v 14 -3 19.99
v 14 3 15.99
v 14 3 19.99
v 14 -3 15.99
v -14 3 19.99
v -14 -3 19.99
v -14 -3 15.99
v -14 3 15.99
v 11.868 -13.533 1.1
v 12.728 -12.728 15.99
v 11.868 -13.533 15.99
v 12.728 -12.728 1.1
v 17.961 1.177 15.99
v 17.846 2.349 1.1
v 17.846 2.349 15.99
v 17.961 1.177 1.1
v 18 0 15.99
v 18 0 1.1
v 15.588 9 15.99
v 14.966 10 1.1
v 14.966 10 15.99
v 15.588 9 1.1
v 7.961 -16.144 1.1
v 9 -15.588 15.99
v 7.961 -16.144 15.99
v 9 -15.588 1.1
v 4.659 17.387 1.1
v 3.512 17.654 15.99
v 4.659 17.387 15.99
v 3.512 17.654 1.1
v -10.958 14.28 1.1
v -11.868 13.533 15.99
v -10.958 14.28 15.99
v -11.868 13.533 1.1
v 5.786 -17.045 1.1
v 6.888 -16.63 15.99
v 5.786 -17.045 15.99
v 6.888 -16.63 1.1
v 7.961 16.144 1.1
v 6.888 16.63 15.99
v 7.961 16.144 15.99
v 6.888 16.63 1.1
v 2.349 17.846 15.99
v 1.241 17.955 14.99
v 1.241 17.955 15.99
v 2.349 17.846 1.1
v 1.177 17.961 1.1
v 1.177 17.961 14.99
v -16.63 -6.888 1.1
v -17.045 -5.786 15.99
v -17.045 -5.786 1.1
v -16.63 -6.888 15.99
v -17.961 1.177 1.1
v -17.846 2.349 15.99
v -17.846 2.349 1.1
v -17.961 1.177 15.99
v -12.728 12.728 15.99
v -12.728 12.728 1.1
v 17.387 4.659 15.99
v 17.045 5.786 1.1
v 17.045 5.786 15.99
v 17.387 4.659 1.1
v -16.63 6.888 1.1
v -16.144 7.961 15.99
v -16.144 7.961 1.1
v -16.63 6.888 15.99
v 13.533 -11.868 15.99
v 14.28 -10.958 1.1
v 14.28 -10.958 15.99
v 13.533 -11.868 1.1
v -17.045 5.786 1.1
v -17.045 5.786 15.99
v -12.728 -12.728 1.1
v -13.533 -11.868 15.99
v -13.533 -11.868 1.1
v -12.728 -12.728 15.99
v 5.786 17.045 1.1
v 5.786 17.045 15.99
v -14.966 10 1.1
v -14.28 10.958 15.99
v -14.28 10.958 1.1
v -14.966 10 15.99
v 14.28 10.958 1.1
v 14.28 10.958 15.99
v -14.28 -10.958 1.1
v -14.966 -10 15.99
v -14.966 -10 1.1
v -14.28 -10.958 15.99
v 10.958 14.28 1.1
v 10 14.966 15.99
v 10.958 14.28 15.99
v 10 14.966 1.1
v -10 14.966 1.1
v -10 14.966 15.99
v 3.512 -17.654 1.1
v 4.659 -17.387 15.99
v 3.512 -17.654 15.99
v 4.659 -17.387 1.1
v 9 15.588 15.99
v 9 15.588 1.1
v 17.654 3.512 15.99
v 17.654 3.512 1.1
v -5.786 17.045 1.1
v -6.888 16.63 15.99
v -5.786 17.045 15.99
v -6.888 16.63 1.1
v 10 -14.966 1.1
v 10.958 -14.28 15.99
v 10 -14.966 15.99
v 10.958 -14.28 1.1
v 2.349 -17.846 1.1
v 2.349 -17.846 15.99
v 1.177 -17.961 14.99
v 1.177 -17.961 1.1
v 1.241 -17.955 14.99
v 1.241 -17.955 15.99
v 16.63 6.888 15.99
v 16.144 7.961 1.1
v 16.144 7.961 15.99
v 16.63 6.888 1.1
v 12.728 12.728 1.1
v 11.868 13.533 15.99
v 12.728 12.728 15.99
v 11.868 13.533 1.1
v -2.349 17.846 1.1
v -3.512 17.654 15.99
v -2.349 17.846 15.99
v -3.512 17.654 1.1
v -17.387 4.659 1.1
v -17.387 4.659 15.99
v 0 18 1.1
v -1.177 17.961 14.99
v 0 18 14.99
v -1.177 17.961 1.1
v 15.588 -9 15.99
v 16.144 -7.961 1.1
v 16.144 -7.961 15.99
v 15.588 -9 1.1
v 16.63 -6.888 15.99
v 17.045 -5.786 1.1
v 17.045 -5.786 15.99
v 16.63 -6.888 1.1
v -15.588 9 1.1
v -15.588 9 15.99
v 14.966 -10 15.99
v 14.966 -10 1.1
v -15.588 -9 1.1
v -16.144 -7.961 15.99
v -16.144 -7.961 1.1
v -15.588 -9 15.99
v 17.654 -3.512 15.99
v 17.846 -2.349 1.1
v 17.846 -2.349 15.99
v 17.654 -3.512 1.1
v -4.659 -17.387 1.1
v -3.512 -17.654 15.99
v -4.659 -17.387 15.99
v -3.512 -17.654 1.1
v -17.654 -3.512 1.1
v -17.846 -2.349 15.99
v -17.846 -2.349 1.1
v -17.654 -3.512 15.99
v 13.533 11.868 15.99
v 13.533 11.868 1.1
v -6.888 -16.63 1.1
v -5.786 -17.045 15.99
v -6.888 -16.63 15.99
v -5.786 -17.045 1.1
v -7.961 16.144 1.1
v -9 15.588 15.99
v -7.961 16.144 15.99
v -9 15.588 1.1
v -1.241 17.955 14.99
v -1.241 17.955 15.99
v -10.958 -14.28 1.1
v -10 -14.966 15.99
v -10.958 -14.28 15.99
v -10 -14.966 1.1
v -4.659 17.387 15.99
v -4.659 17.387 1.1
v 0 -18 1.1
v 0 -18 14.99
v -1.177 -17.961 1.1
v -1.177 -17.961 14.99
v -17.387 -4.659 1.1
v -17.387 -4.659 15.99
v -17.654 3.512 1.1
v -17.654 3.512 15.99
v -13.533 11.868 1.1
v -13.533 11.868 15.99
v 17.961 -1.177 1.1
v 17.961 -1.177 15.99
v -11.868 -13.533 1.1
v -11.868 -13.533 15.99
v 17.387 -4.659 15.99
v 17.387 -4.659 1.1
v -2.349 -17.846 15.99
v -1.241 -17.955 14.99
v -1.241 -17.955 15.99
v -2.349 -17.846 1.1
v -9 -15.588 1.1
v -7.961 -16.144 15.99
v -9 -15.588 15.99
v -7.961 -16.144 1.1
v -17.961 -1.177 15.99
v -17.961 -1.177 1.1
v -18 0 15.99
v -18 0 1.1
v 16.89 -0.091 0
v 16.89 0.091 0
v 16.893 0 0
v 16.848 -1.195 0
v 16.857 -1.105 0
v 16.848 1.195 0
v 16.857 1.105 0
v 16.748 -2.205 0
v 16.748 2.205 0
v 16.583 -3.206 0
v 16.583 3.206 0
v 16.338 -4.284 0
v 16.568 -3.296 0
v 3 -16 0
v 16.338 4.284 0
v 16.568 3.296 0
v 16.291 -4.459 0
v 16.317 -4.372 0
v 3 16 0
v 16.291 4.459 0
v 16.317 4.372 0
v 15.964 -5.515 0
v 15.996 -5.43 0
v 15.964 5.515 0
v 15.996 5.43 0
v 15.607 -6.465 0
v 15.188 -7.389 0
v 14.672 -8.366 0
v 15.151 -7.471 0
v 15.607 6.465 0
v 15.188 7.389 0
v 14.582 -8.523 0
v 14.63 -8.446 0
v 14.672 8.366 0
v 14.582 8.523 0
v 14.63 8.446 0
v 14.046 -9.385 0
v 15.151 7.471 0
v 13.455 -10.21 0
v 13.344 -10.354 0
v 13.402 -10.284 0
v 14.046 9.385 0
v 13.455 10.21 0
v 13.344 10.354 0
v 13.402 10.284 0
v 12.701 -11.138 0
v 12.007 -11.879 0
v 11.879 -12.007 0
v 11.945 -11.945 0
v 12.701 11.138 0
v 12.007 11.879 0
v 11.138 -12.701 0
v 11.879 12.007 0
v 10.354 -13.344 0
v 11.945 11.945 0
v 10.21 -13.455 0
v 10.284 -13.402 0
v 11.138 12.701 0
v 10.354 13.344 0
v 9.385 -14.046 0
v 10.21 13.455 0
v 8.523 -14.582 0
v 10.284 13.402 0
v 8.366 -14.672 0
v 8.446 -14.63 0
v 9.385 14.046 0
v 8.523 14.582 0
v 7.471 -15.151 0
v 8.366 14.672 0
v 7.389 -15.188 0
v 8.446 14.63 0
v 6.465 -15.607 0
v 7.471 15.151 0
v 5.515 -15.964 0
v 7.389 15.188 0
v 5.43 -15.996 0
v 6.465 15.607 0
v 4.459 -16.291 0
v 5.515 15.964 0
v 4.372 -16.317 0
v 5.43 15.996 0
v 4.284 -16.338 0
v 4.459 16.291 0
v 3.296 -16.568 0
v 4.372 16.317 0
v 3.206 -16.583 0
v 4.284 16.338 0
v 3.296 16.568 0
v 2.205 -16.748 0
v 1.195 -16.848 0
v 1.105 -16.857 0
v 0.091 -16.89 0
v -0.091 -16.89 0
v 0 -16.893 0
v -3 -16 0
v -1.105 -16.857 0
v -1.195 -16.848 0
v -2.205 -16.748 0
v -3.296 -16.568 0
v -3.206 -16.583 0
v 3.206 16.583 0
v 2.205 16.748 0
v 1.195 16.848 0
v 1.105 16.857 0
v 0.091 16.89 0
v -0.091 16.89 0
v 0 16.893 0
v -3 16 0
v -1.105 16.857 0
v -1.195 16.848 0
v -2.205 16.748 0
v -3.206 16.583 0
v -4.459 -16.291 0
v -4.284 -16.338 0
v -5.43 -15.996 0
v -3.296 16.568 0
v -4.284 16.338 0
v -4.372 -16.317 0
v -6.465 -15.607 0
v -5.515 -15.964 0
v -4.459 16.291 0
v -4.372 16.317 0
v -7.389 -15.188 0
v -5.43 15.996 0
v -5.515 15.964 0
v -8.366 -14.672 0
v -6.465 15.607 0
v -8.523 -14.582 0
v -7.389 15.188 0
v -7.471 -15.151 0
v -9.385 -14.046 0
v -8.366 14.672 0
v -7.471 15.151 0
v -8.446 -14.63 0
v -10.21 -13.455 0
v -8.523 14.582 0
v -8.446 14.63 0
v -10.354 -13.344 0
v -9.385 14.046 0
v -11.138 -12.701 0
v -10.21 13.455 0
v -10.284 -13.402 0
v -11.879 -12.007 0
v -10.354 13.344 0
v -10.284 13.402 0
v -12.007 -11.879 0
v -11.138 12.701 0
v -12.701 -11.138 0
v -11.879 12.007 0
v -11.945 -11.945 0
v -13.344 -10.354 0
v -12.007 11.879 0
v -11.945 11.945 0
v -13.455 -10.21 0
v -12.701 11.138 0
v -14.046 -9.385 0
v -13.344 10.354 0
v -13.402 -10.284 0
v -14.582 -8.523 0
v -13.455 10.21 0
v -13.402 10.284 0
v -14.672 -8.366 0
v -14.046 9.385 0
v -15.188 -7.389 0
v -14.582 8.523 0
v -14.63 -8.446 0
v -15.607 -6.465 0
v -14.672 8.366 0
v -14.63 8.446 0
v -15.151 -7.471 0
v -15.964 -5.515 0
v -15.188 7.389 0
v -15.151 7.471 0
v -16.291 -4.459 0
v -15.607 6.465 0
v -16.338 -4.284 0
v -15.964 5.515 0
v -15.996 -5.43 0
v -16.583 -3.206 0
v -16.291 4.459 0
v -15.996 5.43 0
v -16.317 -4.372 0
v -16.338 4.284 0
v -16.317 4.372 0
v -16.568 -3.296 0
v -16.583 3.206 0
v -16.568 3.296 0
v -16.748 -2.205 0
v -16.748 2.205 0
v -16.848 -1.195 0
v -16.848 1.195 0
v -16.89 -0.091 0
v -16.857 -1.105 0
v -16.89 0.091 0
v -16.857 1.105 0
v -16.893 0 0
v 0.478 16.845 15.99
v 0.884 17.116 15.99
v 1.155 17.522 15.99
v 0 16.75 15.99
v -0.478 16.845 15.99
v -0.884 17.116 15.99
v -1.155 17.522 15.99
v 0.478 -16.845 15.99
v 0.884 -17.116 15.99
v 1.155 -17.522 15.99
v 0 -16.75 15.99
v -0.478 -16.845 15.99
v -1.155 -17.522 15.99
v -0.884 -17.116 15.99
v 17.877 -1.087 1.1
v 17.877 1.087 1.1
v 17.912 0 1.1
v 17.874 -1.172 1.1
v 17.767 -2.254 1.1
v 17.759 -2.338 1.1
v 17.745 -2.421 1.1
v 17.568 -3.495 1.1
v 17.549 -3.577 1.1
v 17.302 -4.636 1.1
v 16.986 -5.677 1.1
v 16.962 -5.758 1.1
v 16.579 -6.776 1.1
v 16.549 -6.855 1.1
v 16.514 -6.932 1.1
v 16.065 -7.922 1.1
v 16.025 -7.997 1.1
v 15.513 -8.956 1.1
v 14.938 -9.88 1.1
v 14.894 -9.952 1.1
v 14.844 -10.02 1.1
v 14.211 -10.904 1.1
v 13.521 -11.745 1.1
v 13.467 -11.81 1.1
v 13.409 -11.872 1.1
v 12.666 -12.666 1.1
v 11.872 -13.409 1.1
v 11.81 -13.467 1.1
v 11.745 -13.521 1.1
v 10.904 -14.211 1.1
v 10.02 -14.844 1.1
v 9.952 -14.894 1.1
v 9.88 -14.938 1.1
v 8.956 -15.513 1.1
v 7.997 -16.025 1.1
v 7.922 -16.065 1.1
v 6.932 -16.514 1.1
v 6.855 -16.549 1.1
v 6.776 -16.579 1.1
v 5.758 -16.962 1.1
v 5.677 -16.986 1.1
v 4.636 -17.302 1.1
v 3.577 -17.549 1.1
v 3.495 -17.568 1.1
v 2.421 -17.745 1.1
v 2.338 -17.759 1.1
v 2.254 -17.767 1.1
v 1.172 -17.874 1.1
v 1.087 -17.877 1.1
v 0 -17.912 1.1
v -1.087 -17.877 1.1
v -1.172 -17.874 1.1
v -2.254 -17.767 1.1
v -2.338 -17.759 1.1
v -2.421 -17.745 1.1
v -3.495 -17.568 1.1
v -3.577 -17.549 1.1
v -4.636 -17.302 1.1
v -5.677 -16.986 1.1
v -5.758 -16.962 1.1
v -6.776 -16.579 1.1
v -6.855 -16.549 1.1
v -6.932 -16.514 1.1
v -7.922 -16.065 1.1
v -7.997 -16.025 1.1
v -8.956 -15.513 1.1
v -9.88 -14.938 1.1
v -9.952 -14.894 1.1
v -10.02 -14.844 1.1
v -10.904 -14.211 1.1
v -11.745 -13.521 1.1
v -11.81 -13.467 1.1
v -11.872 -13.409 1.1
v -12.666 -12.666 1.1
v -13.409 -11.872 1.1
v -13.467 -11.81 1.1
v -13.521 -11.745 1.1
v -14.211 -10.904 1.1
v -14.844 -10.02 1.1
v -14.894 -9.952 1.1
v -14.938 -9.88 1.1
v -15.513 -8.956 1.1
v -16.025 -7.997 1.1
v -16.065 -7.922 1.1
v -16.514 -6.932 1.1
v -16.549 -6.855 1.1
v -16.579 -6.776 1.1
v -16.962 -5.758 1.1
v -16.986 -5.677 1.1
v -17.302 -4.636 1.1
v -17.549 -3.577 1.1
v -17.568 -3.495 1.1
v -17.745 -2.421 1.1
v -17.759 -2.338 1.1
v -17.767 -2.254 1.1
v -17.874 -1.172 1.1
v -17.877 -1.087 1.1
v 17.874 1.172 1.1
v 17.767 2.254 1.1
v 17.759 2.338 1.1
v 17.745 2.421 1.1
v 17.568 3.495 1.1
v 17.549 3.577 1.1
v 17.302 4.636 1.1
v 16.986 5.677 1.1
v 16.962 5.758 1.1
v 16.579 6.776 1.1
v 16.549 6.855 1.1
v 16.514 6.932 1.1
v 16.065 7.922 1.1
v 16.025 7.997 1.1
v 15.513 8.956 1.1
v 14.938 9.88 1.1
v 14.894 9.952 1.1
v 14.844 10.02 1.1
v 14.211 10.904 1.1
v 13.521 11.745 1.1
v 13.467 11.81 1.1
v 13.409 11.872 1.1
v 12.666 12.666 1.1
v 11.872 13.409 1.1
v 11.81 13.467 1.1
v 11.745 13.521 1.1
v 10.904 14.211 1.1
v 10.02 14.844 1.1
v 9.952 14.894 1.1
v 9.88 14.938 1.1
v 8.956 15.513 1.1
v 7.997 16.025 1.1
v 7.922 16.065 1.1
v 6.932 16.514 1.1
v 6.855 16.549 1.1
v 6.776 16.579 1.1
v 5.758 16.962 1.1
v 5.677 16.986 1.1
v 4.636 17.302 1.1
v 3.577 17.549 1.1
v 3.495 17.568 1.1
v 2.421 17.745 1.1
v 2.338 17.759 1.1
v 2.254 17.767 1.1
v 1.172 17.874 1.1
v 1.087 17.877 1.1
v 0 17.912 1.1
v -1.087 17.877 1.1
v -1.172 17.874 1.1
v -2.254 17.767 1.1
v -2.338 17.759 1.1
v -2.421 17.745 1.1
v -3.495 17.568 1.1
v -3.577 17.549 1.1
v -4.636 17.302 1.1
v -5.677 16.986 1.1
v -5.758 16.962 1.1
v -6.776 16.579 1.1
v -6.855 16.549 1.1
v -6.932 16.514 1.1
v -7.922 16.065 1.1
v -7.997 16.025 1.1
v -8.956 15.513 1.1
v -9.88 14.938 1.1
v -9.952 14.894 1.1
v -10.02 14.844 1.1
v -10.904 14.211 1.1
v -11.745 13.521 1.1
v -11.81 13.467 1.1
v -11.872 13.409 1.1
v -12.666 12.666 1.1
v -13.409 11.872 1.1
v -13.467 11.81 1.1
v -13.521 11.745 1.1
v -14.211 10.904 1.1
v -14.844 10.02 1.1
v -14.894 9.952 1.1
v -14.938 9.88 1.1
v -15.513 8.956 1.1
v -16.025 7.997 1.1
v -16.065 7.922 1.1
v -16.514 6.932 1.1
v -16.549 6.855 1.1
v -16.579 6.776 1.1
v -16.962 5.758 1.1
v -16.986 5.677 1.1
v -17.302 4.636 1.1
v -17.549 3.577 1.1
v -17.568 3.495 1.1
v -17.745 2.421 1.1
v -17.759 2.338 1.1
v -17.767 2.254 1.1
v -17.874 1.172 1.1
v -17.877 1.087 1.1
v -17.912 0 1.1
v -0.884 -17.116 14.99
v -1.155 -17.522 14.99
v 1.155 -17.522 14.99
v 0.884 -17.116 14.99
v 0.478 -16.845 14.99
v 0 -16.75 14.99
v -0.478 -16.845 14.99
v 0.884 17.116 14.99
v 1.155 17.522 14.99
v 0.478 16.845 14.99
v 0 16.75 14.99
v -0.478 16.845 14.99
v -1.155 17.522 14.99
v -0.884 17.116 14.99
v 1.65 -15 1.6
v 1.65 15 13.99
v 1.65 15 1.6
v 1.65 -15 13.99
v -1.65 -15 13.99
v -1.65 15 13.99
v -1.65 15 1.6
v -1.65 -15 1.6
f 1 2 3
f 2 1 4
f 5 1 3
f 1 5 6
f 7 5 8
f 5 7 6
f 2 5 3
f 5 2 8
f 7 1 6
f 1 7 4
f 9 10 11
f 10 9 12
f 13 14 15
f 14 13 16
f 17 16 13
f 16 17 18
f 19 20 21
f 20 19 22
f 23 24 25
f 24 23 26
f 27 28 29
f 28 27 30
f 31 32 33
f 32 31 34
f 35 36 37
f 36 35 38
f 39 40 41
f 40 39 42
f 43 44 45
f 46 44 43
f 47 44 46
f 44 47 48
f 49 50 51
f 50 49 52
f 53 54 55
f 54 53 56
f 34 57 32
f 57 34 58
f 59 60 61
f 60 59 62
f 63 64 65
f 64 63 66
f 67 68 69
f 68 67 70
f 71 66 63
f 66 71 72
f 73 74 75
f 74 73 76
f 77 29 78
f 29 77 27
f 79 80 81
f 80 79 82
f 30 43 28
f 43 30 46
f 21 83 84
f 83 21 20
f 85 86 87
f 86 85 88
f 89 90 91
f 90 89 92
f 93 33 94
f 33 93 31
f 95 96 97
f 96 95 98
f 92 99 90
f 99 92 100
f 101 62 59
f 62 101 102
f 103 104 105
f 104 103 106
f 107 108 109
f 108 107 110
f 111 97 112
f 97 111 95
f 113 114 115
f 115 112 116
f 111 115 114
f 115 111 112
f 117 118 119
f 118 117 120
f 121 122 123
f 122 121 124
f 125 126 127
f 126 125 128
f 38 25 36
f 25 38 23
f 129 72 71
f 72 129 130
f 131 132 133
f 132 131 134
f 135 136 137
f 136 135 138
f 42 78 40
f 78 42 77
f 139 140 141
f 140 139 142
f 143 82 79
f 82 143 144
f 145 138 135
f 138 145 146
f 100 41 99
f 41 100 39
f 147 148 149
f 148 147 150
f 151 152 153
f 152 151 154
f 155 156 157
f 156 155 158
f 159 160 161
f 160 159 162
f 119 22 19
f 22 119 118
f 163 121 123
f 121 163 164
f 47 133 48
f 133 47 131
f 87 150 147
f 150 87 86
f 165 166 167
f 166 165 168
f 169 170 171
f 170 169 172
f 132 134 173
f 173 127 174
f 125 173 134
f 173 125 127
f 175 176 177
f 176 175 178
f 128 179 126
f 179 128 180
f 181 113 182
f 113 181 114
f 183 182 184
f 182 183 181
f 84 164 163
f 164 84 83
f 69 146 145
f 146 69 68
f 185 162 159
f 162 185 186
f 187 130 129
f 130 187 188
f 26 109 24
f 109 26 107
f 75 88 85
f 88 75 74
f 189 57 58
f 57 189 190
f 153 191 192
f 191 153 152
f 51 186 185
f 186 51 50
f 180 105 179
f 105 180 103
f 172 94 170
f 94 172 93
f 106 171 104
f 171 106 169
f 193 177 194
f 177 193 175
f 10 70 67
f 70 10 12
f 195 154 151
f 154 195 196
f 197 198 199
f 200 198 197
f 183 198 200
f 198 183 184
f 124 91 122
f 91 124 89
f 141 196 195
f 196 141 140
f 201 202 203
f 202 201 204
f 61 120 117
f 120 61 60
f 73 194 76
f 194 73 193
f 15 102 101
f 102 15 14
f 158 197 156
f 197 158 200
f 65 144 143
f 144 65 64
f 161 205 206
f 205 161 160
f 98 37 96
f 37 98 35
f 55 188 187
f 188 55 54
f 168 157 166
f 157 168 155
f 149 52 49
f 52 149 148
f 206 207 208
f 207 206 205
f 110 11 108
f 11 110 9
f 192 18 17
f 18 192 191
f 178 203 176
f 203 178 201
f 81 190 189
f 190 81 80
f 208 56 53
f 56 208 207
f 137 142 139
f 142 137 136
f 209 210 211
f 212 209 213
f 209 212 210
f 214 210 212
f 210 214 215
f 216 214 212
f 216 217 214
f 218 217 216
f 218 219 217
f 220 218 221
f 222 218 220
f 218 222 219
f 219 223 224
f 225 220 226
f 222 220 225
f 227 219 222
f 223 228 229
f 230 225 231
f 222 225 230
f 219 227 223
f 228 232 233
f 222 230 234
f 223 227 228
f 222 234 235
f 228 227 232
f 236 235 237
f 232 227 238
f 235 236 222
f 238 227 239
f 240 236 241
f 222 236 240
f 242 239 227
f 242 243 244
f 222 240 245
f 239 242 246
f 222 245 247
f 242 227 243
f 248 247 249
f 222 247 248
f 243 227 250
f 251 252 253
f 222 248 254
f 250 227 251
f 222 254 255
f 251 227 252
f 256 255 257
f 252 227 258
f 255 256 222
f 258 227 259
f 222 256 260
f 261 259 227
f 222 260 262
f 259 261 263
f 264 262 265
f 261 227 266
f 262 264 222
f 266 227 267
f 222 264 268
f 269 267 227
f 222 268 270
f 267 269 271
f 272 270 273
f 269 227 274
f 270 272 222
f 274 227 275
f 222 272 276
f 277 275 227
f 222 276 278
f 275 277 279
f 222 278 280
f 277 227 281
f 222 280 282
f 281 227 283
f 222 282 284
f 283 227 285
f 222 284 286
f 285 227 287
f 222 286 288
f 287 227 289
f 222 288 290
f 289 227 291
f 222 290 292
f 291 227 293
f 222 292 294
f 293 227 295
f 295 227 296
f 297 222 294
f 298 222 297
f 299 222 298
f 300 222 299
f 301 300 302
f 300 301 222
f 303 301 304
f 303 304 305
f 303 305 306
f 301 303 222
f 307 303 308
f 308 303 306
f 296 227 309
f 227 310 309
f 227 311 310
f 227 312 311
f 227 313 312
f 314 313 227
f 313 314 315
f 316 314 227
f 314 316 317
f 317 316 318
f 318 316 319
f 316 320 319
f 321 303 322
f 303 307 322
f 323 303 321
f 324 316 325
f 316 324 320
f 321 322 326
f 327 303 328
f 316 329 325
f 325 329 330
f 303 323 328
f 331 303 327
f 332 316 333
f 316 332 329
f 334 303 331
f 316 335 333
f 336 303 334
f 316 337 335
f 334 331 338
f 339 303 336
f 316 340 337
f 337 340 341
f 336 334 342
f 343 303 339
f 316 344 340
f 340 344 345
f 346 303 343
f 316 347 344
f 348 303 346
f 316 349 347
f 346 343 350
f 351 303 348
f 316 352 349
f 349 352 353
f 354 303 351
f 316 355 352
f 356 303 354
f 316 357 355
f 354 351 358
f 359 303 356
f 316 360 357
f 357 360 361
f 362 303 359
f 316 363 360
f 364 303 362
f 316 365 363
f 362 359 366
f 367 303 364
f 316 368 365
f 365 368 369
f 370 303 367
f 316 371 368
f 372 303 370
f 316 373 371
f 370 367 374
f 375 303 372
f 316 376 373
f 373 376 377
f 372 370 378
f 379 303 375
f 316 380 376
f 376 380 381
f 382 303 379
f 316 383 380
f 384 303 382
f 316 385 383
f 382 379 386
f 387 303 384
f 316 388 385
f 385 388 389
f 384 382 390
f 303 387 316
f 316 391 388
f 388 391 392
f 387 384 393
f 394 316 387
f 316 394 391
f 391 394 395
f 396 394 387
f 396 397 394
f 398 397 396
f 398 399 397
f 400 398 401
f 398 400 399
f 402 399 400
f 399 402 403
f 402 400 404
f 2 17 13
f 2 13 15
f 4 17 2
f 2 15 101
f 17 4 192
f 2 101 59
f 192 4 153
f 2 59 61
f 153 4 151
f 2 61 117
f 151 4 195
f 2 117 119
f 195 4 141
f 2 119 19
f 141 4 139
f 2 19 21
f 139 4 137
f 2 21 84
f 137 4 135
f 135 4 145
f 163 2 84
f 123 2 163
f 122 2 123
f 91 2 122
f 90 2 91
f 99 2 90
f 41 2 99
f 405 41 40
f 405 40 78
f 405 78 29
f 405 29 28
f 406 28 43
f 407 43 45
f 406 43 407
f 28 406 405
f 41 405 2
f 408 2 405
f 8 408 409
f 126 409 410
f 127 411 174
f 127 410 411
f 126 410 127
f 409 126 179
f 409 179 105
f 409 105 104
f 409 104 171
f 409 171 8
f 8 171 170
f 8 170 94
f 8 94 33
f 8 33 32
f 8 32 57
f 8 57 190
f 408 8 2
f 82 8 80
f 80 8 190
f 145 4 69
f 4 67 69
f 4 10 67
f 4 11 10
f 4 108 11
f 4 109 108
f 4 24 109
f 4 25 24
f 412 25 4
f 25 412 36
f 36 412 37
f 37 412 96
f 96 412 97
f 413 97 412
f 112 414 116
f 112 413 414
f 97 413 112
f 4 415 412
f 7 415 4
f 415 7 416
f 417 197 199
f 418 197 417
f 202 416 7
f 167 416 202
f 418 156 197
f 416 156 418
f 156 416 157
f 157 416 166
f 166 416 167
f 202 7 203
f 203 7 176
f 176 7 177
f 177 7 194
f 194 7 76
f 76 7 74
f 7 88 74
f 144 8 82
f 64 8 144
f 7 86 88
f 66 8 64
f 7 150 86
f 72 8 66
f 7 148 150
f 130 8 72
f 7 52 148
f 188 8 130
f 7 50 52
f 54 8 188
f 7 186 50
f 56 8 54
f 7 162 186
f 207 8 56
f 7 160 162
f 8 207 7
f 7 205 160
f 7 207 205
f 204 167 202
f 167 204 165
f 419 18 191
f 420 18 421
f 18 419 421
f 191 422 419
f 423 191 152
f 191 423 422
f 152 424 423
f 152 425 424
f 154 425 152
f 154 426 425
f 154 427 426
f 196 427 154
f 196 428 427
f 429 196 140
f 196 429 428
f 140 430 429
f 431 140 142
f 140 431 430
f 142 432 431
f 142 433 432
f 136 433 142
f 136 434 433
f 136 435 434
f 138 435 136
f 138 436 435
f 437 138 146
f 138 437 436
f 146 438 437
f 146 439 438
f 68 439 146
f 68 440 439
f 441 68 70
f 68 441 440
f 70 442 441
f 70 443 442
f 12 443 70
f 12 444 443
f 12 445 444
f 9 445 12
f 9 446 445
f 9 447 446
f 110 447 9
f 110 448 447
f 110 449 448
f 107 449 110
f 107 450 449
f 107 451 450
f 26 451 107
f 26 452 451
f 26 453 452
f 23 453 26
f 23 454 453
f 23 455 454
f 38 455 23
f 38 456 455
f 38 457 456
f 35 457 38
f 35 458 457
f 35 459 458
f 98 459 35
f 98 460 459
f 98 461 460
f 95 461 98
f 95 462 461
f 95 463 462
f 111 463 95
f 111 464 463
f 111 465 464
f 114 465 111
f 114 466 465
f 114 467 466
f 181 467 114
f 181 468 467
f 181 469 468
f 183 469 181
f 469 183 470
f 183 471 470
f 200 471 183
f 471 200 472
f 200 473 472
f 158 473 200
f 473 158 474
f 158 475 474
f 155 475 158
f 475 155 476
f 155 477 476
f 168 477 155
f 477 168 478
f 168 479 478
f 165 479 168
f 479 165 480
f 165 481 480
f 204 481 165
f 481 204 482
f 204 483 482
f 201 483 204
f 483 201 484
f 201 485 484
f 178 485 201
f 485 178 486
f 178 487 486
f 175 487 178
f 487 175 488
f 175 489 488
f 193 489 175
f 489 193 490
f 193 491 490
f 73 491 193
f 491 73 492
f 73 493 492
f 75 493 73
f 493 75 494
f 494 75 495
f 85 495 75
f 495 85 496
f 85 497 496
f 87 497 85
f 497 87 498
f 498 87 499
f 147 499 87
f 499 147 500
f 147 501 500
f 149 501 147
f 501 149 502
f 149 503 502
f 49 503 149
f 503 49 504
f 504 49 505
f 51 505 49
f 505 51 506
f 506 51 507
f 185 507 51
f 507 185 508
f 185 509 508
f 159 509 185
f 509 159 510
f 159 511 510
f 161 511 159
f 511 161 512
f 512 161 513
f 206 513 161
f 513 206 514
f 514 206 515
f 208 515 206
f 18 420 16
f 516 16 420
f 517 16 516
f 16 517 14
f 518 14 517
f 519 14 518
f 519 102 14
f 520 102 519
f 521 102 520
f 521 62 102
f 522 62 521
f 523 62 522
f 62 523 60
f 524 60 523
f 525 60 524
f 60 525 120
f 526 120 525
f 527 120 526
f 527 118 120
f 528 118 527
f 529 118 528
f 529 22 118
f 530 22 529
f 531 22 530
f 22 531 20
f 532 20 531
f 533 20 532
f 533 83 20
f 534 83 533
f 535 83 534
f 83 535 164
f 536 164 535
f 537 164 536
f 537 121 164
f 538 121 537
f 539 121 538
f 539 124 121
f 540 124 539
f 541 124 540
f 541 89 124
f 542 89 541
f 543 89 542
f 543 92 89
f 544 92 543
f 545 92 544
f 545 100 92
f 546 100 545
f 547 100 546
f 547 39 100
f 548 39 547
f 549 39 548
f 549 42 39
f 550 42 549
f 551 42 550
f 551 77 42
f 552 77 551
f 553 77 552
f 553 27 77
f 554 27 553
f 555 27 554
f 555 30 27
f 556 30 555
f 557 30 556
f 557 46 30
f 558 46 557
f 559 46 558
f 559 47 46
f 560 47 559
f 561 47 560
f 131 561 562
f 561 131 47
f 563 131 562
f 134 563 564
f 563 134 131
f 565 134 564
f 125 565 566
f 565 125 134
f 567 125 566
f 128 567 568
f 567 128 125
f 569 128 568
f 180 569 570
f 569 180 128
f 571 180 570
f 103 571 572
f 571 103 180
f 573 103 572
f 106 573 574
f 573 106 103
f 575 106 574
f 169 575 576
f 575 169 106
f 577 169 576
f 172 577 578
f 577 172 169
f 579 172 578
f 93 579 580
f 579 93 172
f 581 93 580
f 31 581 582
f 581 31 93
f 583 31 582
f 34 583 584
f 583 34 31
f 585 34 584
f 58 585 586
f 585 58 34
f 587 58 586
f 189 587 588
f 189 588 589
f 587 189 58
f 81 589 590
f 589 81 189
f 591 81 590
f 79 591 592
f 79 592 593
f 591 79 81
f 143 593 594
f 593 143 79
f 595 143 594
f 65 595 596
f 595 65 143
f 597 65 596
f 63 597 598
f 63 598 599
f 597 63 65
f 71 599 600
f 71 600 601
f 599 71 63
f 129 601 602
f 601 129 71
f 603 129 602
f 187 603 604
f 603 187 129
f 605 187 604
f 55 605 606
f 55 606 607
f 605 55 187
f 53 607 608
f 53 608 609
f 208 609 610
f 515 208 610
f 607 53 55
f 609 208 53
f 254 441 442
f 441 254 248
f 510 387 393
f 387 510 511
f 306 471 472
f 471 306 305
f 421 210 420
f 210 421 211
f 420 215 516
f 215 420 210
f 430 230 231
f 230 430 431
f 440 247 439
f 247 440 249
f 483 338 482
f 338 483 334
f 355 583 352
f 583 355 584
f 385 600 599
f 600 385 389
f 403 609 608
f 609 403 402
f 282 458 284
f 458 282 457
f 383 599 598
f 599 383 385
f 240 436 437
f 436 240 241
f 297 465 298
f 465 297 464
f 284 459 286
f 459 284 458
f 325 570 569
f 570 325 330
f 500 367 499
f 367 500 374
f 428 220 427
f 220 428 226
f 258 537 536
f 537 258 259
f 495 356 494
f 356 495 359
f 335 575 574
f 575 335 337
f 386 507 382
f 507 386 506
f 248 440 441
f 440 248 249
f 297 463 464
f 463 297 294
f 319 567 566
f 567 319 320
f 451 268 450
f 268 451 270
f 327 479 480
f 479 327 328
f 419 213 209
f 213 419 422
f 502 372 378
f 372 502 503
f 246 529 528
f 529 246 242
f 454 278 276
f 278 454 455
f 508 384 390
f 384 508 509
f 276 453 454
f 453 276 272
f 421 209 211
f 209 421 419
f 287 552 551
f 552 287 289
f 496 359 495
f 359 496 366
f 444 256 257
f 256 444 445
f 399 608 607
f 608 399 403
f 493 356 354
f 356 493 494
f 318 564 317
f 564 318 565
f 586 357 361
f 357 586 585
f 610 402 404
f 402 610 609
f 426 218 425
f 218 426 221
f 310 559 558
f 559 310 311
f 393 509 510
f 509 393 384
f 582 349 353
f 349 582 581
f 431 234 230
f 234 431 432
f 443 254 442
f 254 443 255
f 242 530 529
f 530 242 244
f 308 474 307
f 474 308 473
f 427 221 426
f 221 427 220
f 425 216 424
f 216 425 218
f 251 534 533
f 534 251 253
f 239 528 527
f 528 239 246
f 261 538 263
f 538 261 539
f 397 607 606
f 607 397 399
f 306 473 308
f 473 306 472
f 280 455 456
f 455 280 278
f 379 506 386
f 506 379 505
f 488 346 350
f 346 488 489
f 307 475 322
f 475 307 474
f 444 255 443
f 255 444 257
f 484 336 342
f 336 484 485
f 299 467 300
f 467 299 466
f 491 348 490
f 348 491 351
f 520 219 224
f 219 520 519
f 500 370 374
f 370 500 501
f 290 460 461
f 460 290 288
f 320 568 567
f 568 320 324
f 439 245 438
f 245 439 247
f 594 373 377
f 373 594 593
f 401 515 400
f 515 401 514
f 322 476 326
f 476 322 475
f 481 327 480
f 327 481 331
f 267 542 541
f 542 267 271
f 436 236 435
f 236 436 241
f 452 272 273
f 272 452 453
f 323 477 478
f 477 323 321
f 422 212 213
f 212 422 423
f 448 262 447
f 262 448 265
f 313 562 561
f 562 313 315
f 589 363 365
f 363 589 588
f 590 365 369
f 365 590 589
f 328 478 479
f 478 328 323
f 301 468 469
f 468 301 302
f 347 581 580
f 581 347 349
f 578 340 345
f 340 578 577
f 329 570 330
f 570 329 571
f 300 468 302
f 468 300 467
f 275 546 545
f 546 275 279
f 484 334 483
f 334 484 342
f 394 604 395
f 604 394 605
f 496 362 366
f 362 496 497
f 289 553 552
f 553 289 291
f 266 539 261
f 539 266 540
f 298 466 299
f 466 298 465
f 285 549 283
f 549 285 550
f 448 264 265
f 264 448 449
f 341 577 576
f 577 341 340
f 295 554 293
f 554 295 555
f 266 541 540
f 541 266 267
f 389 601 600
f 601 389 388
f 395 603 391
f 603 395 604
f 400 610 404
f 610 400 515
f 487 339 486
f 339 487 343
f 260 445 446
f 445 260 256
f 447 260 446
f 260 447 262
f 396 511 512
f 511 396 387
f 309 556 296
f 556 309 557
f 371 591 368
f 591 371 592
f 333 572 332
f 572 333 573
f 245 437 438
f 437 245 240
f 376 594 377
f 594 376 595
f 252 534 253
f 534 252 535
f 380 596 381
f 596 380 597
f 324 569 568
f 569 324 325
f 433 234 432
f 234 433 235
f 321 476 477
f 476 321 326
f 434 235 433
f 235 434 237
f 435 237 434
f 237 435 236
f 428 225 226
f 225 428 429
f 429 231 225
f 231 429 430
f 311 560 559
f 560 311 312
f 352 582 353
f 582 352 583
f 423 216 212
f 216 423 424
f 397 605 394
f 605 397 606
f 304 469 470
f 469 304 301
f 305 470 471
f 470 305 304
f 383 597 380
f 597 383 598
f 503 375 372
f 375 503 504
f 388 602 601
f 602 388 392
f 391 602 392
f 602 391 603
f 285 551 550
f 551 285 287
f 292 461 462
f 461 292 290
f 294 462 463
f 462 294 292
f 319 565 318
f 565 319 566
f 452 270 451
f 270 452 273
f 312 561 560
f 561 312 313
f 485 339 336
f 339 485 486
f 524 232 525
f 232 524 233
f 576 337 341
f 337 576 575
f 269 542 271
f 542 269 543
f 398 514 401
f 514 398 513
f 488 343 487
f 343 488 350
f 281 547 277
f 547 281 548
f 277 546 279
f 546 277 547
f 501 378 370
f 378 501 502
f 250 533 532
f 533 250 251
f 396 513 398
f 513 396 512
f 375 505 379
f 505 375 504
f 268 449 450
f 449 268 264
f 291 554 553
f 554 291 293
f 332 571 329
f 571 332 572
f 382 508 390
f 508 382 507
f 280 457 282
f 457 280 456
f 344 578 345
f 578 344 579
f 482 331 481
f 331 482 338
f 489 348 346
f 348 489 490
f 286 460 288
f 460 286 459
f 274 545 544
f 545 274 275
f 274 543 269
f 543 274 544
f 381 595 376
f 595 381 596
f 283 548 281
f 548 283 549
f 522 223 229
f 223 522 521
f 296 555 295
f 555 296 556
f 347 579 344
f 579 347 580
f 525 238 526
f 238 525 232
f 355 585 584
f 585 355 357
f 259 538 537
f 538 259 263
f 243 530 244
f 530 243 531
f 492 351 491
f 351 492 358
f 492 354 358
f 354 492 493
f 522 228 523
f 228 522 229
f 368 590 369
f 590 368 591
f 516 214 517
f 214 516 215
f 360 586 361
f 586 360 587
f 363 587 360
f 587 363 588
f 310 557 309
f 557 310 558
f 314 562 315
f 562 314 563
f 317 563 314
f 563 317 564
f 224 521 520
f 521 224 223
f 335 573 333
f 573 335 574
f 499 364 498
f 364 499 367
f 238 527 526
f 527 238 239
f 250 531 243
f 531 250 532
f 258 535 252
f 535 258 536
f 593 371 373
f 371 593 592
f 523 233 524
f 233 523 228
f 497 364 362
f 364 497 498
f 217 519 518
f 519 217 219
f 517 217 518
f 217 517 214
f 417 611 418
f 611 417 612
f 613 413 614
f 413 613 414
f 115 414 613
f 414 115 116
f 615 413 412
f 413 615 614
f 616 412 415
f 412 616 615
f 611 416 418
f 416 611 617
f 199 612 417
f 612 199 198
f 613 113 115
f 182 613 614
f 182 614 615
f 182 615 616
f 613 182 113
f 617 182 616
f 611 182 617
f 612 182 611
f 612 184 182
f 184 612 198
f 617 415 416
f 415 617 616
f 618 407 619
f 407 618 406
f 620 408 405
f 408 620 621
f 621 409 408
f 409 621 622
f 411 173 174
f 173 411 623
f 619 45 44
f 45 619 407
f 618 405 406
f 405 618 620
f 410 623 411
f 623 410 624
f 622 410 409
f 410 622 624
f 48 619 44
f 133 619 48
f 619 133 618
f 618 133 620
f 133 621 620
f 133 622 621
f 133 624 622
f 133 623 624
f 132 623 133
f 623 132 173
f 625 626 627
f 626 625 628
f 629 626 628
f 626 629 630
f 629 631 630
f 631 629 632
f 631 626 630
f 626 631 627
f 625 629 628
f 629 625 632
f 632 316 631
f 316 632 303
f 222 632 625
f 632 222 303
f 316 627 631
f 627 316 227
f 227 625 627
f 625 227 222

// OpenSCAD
// Print-ready export: key-turner cap (see key_turner_housing.scad)
use <key_turner_housing.scad>
print_cap();
